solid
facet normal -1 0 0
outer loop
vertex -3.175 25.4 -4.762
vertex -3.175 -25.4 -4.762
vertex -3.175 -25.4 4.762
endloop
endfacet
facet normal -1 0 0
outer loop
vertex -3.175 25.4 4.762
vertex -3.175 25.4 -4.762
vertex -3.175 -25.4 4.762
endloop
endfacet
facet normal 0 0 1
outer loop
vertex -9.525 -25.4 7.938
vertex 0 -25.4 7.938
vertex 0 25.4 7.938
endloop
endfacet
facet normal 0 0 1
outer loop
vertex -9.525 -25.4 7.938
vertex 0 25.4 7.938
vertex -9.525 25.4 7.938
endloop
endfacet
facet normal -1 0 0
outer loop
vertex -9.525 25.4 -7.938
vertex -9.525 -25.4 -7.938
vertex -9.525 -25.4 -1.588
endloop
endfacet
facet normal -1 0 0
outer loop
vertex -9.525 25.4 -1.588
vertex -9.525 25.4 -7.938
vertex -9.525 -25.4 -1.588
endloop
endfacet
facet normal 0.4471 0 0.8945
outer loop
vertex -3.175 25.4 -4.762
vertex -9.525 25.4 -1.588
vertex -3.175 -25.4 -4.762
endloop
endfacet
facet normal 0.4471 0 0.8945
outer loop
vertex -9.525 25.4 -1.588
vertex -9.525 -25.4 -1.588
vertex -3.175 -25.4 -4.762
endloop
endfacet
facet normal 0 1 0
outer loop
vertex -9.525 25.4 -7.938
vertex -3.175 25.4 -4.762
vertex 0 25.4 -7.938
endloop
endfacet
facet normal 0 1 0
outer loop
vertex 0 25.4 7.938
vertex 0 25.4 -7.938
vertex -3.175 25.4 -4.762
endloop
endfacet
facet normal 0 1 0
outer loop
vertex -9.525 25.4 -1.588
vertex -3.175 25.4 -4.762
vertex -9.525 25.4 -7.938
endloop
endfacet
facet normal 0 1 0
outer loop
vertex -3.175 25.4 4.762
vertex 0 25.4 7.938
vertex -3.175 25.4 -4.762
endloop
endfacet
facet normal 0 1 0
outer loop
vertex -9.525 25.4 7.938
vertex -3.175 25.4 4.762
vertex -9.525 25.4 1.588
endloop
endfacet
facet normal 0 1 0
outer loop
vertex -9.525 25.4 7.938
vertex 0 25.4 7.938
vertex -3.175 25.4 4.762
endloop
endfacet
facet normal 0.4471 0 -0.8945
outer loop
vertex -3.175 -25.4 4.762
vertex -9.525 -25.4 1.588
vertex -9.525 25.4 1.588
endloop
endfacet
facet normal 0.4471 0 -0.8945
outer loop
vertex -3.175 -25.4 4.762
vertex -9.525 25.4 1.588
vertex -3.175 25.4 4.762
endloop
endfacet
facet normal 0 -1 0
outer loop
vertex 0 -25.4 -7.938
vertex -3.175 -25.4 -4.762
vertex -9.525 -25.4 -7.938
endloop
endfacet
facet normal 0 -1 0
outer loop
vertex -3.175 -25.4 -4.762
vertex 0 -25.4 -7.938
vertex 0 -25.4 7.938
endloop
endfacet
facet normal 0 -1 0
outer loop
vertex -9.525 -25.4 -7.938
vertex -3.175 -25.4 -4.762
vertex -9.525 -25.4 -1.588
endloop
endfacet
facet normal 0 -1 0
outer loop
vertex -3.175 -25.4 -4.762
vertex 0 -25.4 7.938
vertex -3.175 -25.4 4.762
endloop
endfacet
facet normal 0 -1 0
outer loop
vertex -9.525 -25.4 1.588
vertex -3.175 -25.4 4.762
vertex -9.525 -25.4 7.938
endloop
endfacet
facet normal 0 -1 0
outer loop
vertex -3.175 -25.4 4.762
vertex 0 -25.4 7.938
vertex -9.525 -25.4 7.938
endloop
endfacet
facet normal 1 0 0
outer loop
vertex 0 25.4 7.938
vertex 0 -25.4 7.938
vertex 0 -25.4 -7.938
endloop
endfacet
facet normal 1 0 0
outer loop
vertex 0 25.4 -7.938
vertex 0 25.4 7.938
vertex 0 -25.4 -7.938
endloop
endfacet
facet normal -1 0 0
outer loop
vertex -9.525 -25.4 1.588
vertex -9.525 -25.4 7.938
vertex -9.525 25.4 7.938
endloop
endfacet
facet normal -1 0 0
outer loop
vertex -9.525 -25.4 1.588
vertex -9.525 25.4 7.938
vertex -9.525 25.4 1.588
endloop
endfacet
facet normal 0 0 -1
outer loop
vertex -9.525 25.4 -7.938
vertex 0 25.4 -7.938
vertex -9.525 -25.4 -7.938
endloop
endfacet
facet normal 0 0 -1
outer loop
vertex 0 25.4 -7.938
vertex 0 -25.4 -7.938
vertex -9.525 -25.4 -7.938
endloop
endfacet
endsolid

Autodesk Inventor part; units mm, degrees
ref_plane "YZ Plane" through (0, 0, 0) normal (1, 0, 0) x (0, 1, 0)
ref_plane "XZ Plane" through (0, 0, 0) normal (0, 1, 0) x (-1, 0, 0)
ref_plane "XY Plane" through (0, 0, 0) normal (0, 0, 1) x (1, 0, 0)
sketch "Sketch2" plane through (0, 0, 0) normal (0, 1, 0) x (-1, 0, 0)
  line L0 (0, 0) -> (0, -7.9375)
  line L1 (0, -7.9375) -> (9.525, -7.9375)
  line L2 (9.525, -7.9375) -> (9.525, -1.5875)
  line L3 (9.525, -1.5875) -> (3.175, -4.7625)
  line L4 (3.175, -4.7625) -> (3.175, 0)
  line L5 (3.175, 0) -> (0, 0)
  line L6 (0, 0) -> (0, 7.9375)
  line L7 (0, 7.9375) -> (9.525, 7.9375)
  line L8 (9.525, 7.9375) -> (9.525, 1.5875)
  line L9 (9.525, 1.5875) -> (3.175, 4.7625)
  line L10 (3.175, 4.7625) -> (3.175, 0)
  dimension "d1" = 7.9375
  dimension "d2" = 9.525
  dimension "d3" = 6.35
  dimension "d4" = 4.7625
  dimension "d5" = 3.175
extrude "Extrusion1" add sketch "Sketch2" along normal mid plane 50.8
properties part number "testcombine"
